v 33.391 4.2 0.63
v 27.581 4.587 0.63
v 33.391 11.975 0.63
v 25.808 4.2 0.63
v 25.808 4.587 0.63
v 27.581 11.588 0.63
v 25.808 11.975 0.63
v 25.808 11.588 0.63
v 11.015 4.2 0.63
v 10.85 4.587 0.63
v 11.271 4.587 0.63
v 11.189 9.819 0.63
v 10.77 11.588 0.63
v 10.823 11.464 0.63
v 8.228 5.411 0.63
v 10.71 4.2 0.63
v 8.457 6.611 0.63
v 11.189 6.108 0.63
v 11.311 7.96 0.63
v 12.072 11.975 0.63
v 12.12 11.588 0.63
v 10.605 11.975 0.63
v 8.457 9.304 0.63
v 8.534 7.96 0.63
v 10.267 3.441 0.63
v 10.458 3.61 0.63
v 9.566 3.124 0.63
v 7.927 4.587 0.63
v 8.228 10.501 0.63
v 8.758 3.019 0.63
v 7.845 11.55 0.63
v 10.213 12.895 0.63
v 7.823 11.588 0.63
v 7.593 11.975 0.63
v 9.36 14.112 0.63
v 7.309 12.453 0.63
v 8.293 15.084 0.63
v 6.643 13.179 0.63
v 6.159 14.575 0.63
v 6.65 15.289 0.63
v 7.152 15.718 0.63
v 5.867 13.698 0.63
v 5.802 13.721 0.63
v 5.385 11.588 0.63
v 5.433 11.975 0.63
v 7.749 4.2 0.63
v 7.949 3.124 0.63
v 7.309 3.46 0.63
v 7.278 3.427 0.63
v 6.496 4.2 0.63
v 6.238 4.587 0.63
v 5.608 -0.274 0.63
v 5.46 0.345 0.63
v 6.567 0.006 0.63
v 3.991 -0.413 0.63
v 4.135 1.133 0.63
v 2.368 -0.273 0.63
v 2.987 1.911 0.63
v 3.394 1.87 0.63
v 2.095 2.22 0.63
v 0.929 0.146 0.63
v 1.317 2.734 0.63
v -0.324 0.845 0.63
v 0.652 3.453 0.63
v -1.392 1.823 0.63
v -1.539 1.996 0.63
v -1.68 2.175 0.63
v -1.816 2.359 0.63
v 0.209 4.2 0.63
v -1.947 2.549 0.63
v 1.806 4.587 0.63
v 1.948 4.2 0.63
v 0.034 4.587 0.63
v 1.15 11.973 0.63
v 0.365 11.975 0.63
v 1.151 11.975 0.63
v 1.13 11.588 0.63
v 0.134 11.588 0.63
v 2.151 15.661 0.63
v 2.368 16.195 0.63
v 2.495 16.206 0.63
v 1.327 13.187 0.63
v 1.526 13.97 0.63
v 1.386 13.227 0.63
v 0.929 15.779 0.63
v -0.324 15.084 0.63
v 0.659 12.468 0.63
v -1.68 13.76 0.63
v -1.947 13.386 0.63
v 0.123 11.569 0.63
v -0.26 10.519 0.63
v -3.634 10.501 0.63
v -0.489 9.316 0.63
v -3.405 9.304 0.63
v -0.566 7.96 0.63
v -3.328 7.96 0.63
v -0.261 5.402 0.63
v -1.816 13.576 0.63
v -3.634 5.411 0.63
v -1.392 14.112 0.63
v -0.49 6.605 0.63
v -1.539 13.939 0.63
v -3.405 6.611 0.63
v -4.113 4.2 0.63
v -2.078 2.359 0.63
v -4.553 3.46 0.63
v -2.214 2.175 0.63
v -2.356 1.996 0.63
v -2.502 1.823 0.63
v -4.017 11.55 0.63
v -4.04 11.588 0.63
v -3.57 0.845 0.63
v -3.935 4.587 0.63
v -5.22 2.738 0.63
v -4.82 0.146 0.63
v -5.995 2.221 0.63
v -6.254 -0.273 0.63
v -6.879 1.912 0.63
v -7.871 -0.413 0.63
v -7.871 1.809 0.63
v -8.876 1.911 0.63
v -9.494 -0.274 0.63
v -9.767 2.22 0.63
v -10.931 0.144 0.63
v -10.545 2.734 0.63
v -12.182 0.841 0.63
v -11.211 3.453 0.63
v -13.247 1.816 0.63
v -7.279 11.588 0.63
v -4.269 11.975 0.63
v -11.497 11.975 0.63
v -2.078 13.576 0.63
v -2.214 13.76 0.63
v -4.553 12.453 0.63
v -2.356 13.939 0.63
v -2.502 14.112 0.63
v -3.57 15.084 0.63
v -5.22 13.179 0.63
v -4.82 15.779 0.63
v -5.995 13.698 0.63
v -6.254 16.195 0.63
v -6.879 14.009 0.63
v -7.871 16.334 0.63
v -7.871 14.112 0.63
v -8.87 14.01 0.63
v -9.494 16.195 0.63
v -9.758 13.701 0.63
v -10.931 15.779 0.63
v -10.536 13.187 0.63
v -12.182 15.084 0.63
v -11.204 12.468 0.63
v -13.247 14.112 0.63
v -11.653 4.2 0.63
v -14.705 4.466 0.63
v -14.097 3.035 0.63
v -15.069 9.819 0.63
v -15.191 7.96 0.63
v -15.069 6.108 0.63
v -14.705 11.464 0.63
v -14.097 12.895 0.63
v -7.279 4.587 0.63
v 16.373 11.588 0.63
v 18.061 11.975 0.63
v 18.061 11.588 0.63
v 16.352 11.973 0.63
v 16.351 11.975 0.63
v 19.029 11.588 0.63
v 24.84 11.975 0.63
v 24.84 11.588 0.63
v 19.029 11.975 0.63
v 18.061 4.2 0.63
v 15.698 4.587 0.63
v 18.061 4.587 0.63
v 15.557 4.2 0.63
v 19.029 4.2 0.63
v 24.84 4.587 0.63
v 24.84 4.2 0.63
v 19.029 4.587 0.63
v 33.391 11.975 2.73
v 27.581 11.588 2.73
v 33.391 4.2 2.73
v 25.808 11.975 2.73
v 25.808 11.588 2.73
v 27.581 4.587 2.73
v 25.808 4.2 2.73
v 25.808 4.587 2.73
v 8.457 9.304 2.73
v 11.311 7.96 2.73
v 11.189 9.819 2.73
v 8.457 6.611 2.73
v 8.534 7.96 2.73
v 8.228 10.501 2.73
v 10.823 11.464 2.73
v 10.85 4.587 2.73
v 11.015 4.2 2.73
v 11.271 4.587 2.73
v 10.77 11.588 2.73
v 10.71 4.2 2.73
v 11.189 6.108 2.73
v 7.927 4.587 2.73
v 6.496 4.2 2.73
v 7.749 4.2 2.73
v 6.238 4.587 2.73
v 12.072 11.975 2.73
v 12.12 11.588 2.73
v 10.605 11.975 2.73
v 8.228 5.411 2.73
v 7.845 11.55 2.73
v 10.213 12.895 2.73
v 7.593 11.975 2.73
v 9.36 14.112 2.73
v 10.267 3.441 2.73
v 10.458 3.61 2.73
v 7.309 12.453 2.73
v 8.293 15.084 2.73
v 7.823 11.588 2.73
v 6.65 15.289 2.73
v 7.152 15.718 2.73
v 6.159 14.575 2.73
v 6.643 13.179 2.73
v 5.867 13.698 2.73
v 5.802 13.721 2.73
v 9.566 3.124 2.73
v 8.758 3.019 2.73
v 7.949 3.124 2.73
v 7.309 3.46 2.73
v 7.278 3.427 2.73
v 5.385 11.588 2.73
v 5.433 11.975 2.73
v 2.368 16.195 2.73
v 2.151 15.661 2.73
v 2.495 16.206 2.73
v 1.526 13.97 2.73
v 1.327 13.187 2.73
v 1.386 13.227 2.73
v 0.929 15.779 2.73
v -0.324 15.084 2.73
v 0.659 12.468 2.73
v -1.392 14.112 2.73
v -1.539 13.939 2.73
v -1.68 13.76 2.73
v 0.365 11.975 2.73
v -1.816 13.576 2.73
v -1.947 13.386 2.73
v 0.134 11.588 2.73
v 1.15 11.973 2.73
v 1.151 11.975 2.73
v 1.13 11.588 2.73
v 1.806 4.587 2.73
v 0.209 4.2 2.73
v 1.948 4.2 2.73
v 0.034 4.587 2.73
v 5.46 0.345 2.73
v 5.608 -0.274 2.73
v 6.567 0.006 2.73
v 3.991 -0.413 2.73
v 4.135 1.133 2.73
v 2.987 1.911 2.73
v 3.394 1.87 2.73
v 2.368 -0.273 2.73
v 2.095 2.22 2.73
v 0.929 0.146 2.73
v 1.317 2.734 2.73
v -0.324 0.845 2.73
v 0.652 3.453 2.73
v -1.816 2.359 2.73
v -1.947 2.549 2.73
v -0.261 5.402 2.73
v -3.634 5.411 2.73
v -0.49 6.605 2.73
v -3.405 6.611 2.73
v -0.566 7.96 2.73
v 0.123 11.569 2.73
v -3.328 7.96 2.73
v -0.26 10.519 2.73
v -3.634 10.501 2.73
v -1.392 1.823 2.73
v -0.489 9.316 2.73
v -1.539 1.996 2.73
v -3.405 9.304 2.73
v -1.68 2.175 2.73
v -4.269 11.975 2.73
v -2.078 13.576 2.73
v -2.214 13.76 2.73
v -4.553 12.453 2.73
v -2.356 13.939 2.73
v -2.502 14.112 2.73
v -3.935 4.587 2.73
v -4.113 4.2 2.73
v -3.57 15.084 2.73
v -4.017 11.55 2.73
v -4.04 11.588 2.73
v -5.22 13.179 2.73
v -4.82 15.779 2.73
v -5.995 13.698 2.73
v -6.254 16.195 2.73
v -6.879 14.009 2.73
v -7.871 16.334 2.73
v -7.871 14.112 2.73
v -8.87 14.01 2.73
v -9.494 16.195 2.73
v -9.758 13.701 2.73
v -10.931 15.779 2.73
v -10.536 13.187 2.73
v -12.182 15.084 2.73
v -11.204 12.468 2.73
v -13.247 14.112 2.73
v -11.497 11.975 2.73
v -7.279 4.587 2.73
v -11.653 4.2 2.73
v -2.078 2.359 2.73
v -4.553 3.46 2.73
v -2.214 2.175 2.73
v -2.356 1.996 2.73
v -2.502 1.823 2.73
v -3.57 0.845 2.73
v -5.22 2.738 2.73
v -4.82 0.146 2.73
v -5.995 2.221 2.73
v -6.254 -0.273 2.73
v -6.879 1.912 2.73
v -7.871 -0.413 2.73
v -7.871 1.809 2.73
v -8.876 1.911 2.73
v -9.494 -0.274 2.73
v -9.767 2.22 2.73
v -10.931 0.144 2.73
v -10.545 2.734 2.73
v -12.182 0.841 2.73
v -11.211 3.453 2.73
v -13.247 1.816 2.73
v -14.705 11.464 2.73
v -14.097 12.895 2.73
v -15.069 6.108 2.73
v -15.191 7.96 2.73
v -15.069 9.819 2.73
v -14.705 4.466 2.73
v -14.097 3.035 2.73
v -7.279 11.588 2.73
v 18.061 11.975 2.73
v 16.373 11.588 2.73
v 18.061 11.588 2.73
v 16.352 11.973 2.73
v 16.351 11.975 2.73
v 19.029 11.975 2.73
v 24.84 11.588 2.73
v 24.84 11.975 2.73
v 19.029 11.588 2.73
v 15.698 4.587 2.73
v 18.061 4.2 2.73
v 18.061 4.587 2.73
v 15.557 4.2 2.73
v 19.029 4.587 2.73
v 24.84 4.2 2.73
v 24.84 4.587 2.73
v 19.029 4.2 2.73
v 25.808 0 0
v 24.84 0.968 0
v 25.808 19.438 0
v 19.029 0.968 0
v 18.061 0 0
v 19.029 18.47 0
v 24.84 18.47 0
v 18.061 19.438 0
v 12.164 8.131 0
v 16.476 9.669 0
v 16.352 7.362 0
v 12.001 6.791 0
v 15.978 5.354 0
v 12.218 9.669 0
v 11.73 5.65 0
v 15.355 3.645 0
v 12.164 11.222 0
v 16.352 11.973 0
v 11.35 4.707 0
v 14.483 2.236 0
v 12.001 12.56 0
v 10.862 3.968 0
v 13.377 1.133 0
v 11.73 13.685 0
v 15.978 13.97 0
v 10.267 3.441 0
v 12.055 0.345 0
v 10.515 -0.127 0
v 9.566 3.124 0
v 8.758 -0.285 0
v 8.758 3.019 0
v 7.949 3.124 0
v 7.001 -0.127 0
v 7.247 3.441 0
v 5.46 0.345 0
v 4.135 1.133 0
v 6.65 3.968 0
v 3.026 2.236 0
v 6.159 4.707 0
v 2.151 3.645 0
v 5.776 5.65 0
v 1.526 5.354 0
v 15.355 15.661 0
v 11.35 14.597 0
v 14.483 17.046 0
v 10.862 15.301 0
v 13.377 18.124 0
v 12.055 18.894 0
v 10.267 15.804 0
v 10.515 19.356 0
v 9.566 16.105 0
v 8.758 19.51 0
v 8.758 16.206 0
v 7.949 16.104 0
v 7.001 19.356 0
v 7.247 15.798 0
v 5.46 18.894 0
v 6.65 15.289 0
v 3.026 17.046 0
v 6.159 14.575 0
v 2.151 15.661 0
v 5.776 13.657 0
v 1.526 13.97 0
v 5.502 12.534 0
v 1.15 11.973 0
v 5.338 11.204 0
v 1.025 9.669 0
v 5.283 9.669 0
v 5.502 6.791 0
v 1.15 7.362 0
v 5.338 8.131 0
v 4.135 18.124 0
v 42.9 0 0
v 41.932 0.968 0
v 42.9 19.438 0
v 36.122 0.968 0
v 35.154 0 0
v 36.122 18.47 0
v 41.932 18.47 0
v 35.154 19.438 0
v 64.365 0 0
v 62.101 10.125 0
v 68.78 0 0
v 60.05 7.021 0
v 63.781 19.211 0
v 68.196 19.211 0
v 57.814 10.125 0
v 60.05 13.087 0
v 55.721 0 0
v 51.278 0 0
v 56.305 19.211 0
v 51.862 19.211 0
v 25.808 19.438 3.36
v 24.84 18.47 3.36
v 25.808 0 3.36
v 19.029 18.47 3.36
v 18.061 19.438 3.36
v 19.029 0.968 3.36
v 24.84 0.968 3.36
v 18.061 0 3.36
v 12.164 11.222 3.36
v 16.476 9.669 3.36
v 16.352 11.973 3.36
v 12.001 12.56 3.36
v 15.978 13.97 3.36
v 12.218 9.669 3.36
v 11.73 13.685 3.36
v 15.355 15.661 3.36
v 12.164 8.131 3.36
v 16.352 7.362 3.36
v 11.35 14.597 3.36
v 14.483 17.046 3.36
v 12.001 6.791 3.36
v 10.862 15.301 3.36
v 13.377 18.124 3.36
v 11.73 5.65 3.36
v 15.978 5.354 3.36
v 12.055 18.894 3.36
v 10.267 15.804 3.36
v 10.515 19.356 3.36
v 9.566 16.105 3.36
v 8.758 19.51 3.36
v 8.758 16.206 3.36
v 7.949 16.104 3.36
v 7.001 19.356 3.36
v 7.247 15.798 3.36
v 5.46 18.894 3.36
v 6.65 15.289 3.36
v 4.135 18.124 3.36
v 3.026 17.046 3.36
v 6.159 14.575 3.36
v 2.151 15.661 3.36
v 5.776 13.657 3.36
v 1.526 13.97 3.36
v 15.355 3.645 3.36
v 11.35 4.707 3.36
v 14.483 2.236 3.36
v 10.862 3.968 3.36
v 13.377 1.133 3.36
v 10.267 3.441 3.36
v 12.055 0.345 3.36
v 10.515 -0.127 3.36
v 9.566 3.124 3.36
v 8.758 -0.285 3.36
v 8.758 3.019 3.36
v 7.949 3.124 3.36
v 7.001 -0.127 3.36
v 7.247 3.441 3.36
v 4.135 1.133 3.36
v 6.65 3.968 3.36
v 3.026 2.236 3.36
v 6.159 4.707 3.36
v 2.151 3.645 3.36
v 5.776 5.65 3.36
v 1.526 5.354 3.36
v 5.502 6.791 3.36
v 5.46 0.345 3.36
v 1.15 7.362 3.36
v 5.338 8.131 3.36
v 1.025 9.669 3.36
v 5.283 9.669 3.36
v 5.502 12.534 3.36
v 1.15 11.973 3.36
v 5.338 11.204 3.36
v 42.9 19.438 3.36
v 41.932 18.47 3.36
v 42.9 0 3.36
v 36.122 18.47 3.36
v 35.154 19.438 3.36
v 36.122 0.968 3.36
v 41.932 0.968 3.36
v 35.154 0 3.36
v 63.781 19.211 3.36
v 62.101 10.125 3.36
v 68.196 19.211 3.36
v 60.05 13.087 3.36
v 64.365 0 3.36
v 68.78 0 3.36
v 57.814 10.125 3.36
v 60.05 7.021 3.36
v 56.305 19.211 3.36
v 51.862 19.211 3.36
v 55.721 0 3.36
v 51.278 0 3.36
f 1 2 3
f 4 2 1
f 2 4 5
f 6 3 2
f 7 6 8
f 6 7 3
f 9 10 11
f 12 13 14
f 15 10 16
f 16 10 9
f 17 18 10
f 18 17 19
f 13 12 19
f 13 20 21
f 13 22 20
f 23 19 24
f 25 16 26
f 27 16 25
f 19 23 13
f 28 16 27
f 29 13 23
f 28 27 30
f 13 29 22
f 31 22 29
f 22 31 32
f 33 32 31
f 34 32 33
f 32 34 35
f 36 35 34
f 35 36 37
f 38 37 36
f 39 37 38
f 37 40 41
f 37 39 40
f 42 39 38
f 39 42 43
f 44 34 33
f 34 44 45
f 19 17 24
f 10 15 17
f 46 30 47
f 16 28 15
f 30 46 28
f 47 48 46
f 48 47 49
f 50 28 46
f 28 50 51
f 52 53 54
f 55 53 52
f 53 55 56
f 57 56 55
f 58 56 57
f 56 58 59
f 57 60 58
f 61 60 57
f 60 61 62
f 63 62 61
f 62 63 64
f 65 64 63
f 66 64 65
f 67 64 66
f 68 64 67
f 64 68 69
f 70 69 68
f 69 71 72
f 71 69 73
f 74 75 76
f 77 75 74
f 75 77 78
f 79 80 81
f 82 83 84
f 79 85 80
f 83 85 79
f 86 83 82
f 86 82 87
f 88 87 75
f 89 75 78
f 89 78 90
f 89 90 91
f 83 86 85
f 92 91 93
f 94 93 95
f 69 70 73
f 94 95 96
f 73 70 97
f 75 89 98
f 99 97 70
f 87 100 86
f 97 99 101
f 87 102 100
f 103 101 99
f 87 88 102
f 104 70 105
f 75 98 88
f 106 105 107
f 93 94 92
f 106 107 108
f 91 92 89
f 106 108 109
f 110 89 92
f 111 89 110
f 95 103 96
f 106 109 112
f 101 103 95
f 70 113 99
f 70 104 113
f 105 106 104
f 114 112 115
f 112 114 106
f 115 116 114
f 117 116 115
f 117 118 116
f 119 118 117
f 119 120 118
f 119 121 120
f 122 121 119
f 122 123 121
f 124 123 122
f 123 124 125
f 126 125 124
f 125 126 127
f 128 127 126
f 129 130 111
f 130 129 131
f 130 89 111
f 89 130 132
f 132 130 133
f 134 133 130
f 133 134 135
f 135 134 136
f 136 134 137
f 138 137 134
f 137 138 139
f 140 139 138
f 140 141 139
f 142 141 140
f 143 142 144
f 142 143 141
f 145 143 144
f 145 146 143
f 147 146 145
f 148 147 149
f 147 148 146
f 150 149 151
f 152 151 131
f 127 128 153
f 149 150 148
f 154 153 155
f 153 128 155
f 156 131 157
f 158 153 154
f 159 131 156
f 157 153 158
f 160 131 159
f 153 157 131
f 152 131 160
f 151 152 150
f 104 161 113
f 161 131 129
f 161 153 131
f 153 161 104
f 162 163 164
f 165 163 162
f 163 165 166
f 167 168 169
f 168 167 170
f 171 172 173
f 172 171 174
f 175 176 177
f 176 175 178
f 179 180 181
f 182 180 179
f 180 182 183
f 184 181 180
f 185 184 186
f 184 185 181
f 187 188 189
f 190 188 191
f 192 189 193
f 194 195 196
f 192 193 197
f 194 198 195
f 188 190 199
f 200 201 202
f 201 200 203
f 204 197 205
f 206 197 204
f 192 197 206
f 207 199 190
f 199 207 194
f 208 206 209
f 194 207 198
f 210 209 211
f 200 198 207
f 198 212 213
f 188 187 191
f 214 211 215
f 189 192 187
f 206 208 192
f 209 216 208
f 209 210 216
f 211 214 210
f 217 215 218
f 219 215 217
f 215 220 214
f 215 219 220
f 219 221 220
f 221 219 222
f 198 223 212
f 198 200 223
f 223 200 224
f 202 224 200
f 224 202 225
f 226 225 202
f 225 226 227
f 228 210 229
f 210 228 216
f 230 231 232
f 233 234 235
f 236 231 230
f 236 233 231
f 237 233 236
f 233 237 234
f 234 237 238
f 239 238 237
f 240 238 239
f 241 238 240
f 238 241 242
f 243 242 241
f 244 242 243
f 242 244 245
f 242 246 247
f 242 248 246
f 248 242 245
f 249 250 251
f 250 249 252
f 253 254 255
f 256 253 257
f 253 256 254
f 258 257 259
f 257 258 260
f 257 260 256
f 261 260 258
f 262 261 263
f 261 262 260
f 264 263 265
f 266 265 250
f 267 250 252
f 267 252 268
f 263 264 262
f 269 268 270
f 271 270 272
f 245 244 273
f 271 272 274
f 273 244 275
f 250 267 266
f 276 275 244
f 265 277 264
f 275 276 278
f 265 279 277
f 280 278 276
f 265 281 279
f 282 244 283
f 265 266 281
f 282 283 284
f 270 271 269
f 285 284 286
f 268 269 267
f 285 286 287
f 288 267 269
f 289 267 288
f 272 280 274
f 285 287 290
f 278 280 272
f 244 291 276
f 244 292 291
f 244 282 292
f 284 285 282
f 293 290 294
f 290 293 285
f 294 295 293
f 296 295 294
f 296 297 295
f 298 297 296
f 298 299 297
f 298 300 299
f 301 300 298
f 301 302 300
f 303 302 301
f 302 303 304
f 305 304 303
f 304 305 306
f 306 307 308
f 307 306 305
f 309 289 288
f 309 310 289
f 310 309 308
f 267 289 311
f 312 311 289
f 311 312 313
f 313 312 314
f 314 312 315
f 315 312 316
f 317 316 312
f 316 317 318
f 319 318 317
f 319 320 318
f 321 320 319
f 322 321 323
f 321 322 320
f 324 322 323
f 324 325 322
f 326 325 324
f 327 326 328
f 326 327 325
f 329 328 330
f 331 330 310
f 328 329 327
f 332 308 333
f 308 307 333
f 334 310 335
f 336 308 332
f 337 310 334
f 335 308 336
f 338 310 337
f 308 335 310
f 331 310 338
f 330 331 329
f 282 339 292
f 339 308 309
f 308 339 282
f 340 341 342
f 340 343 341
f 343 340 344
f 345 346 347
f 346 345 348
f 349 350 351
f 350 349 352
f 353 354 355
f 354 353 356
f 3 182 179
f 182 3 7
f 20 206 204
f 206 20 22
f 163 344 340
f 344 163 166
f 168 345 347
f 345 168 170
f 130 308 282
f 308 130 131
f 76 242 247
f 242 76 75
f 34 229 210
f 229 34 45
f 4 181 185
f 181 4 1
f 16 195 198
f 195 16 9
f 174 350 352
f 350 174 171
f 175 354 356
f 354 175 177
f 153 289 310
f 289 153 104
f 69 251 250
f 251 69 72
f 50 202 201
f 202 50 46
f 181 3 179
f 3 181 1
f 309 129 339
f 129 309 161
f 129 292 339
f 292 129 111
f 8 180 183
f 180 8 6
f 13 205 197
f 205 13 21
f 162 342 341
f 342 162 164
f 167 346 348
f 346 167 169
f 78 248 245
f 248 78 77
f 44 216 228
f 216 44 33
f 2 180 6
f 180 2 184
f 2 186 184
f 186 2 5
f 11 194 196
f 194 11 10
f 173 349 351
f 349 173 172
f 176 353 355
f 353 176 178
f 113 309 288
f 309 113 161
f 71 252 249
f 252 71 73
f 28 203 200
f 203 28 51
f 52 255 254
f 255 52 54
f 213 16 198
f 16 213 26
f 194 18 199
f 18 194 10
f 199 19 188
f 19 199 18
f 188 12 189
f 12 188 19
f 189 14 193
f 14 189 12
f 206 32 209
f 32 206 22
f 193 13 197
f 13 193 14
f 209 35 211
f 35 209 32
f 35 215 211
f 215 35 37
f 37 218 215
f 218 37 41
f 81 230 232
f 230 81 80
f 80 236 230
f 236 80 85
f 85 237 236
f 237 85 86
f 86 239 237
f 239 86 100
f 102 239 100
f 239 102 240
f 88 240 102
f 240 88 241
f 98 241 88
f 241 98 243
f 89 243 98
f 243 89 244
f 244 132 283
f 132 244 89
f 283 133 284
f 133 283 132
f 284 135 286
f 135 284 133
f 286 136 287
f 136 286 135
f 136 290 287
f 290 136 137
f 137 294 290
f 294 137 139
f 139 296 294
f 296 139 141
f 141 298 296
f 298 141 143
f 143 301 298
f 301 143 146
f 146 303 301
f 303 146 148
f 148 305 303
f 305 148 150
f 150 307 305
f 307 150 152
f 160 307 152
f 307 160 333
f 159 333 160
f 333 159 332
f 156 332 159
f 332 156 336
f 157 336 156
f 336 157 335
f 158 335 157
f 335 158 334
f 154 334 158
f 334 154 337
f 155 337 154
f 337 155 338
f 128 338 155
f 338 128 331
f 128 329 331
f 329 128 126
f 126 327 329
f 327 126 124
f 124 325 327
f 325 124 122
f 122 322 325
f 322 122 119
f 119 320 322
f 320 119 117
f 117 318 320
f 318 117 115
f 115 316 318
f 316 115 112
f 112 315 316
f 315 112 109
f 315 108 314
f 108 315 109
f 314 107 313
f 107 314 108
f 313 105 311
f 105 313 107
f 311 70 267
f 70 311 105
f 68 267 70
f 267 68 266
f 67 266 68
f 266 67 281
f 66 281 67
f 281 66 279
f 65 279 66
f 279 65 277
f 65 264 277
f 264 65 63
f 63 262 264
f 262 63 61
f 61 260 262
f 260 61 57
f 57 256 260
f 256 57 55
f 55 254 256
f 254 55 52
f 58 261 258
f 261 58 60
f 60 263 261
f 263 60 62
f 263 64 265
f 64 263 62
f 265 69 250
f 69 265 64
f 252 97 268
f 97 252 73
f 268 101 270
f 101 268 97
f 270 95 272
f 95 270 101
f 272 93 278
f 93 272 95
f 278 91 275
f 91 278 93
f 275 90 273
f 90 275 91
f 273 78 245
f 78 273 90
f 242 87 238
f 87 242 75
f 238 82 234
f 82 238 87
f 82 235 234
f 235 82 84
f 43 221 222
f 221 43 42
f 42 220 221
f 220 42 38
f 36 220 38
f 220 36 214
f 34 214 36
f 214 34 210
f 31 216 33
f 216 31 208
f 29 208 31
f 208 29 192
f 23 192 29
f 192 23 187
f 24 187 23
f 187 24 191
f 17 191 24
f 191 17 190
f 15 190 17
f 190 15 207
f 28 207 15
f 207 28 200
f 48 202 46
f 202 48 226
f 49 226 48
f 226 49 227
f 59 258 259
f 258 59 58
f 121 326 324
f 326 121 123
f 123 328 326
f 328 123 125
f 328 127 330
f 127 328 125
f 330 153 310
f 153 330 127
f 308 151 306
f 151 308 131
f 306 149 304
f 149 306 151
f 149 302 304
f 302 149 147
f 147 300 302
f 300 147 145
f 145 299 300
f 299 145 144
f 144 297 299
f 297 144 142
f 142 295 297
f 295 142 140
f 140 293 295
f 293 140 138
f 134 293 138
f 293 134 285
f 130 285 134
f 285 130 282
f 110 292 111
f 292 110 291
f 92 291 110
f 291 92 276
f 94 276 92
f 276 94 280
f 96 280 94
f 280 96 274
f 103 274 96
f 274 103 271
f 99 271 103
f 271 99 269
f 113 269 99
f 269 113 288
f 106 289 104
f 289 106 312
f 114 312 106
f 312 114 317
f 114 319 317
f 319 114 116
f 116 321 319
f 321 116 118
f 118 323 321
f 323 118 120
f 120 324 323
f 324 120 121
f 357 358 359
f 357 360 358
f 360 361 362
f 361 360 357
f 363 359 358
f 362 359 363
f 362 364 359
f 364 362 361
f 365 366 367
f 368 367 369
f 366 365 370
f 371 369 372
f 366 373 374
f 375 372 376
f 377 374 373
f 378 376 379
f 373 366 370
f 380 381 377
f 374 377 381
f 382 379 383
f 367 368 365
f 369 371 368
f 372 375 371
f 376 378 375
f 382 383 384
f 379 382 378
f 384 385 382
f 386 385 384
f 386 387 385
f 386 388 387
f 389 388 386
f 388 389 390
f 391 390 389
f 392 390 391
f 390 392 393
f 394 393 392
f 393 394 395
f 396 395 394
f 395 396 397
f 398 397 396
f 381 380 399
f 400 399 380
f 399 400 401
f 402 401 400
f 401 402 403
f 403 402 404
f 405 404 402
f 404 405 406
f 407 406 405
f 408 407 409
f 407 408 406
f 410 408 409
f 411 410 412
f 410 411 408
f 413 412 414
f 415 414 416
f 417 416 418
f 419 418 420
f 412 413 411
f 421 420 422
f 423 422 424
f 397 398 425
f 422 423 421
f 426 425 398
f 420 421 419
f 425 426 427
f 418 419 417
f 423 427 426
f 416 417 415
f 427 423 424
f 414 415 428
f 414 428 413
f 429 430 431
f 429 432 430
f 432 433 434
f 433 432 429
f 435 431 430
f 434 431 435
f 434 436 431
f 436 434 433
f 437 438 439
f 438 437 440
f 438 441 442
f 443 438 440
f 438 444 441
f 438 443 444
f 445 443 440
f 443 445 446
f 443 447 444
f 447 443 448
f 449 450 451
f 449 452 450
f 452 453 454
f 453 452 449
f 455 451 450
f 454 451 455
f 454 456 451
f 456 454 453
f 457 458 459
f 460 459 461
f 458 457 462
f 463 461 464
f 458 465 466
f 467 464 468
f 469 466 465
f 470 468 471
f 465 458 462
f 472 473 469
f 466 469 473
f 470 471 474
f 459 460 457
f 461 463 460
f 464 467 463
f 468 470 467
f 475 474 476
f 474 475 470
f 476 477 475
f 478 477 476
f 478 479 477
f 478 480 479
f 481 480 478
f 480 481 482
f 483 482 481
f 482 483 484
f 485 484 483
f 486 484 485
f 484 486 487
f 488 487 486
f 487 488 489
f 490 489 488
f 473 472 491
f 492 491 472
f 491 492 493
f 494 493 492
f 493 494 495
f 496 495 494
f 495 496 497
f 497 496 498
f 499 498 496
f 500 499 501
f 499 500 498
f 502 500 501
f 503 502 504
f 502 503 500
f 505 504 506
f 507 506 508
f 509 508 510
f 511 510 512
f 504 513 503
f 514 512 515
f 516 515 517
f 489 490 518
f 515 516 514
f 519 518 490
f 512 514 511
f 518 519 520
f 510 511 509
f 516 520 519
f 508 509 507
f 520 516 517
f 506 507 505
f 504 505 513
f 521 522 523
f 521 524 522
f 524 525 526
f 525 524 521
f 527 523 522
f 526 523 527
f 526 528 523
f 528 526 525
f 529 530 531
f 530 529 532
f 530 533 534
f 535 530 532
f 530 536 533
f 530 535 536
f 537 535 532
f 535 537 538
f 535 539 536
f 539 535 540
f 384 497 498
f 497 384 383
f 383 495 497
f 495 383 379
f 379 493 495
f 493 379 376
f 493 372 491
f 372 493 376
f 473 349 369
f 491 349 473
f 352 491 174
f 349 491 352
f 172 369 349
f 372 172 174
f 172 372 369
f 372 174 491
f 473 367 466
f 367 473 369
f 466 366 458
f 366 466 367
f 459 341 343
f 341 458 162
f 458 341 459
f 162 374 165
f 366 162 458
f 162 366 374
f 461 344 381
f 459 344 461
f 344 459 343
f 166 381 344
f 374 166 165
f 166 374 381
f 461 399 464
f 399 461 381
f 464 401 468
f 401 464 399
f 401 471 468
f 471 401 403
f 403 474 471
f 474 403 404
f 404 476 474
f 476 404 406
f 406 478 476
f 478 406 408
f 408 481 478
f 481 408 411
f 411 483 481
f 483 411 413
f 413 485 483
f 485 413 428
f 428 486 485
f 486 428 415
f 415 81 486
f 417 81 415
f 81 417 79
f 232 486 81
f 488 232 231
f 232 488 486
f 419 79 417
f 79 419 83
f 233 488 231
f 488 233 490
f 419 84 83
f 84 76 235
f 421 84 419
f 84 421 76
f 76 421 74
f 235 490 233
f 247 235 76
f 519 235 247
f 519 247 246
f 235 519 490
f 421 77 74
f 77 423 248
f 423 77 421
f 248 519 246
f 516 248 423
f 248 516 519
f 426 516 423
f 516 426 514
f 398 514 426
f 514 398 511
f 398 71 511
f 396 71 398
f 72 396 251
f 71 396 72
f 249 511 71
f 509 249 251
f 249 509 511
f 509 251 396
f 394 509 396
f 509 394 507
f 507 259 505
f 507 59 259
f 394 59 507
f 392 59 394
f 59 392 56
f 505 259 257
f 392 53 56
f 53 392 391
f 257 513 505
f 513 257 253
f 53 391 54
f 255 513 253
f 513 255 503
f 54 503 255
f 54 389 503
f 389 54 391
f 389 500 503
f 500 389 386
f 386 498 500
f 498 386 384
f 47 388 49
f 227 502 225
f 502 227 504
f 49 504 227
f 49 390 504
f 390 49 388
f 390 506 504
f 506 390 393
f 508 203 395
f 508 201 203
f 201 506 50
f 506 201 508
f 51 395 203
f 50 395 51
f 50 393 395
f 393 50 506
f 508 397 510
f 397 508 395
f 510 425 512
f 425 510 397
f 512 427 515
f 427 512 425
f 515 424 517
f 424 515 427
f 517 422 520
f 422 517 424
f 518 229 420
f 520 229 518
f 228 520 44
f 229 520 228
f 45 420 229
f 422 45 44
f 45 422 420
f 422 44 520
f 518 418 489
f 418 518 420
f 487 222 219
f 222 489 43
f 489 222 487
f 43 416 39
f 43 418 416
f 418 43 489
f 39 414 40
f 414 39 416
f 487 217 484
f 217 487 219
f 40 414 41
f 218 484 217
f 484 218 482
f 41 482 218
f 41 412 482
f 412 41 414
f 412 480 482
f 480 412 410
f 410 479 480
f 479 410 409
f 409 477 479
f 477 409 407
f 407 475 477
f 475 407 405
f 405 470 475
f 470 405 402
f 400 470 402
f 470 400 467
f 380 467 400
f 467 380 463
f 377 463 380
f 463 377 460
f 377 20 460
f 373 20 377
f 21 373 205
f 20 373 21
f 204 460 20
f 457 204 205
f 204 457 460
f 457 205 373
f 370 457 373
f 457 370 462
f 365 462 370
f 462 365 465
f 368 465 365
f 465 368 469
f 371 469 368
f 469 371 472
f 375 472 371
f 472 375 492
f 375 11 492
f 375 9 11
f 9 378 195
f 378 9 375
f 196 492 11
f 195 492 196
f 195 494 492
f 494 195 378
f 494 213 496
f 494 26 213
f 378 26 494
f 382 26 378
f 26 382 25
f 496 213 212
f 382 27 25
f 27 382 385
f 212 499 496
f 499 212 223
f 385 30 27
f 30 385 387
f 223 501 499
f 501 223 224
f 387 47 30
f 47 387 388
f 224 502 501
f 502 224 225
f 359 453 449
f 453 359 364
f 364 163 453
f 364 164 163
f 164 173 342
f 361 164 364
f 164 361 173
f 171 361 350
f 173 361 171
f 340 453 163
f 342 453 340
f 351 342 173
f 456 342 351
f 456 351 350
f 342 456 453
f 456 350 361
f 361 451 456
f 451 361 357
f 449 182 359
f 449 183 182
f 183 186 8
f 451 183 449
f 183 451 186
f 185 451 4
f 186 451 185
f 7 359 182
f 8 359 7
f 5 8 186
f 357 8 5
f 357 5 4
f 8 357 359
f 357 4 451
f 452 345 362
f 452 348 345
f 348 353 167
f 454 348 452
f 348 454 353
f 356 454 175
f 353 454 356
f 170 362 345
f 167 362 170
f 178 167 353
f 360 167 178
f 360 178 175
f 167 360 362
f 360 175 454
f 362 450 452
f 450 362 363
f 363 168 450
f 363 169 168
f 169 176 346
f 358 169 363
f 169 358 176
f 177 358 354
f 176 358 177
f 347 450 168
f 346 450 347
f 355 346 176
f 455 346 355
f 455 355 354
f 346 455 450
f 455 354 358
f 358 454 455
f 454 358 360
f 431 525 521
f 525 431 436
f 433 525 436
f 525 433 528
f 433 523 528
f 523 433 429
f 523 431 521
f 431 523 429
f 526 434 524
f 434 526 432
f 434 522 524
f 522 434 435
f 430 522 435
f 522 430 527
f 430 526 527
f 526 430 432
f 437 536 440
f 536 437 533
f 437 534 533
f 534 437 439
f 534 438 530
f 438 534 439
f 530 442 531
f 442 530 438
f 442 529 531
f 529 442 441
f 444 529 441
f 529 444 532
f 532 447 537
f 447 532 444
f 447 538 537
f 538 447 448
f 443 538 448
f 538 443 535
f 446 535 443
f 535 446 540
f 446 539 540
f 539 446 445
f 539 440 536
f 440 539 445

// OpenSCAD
scale(2.1) 

{
linear_extrude(1.6)
text("OՈӘΧ", font="courier new:style=Bold");


    color("red")
   translate([0,0,0.3])
   {
    scale([6, .4, 1])
    translate([-1.5,5,0])
    linear_extrude(1)
    text("ϟ", font="courier new:style=Bold");
    
    
    linear_extrude(1)
    translate([-8,0,0])
    text("ꝏ", font="tahoma");
    }

}
